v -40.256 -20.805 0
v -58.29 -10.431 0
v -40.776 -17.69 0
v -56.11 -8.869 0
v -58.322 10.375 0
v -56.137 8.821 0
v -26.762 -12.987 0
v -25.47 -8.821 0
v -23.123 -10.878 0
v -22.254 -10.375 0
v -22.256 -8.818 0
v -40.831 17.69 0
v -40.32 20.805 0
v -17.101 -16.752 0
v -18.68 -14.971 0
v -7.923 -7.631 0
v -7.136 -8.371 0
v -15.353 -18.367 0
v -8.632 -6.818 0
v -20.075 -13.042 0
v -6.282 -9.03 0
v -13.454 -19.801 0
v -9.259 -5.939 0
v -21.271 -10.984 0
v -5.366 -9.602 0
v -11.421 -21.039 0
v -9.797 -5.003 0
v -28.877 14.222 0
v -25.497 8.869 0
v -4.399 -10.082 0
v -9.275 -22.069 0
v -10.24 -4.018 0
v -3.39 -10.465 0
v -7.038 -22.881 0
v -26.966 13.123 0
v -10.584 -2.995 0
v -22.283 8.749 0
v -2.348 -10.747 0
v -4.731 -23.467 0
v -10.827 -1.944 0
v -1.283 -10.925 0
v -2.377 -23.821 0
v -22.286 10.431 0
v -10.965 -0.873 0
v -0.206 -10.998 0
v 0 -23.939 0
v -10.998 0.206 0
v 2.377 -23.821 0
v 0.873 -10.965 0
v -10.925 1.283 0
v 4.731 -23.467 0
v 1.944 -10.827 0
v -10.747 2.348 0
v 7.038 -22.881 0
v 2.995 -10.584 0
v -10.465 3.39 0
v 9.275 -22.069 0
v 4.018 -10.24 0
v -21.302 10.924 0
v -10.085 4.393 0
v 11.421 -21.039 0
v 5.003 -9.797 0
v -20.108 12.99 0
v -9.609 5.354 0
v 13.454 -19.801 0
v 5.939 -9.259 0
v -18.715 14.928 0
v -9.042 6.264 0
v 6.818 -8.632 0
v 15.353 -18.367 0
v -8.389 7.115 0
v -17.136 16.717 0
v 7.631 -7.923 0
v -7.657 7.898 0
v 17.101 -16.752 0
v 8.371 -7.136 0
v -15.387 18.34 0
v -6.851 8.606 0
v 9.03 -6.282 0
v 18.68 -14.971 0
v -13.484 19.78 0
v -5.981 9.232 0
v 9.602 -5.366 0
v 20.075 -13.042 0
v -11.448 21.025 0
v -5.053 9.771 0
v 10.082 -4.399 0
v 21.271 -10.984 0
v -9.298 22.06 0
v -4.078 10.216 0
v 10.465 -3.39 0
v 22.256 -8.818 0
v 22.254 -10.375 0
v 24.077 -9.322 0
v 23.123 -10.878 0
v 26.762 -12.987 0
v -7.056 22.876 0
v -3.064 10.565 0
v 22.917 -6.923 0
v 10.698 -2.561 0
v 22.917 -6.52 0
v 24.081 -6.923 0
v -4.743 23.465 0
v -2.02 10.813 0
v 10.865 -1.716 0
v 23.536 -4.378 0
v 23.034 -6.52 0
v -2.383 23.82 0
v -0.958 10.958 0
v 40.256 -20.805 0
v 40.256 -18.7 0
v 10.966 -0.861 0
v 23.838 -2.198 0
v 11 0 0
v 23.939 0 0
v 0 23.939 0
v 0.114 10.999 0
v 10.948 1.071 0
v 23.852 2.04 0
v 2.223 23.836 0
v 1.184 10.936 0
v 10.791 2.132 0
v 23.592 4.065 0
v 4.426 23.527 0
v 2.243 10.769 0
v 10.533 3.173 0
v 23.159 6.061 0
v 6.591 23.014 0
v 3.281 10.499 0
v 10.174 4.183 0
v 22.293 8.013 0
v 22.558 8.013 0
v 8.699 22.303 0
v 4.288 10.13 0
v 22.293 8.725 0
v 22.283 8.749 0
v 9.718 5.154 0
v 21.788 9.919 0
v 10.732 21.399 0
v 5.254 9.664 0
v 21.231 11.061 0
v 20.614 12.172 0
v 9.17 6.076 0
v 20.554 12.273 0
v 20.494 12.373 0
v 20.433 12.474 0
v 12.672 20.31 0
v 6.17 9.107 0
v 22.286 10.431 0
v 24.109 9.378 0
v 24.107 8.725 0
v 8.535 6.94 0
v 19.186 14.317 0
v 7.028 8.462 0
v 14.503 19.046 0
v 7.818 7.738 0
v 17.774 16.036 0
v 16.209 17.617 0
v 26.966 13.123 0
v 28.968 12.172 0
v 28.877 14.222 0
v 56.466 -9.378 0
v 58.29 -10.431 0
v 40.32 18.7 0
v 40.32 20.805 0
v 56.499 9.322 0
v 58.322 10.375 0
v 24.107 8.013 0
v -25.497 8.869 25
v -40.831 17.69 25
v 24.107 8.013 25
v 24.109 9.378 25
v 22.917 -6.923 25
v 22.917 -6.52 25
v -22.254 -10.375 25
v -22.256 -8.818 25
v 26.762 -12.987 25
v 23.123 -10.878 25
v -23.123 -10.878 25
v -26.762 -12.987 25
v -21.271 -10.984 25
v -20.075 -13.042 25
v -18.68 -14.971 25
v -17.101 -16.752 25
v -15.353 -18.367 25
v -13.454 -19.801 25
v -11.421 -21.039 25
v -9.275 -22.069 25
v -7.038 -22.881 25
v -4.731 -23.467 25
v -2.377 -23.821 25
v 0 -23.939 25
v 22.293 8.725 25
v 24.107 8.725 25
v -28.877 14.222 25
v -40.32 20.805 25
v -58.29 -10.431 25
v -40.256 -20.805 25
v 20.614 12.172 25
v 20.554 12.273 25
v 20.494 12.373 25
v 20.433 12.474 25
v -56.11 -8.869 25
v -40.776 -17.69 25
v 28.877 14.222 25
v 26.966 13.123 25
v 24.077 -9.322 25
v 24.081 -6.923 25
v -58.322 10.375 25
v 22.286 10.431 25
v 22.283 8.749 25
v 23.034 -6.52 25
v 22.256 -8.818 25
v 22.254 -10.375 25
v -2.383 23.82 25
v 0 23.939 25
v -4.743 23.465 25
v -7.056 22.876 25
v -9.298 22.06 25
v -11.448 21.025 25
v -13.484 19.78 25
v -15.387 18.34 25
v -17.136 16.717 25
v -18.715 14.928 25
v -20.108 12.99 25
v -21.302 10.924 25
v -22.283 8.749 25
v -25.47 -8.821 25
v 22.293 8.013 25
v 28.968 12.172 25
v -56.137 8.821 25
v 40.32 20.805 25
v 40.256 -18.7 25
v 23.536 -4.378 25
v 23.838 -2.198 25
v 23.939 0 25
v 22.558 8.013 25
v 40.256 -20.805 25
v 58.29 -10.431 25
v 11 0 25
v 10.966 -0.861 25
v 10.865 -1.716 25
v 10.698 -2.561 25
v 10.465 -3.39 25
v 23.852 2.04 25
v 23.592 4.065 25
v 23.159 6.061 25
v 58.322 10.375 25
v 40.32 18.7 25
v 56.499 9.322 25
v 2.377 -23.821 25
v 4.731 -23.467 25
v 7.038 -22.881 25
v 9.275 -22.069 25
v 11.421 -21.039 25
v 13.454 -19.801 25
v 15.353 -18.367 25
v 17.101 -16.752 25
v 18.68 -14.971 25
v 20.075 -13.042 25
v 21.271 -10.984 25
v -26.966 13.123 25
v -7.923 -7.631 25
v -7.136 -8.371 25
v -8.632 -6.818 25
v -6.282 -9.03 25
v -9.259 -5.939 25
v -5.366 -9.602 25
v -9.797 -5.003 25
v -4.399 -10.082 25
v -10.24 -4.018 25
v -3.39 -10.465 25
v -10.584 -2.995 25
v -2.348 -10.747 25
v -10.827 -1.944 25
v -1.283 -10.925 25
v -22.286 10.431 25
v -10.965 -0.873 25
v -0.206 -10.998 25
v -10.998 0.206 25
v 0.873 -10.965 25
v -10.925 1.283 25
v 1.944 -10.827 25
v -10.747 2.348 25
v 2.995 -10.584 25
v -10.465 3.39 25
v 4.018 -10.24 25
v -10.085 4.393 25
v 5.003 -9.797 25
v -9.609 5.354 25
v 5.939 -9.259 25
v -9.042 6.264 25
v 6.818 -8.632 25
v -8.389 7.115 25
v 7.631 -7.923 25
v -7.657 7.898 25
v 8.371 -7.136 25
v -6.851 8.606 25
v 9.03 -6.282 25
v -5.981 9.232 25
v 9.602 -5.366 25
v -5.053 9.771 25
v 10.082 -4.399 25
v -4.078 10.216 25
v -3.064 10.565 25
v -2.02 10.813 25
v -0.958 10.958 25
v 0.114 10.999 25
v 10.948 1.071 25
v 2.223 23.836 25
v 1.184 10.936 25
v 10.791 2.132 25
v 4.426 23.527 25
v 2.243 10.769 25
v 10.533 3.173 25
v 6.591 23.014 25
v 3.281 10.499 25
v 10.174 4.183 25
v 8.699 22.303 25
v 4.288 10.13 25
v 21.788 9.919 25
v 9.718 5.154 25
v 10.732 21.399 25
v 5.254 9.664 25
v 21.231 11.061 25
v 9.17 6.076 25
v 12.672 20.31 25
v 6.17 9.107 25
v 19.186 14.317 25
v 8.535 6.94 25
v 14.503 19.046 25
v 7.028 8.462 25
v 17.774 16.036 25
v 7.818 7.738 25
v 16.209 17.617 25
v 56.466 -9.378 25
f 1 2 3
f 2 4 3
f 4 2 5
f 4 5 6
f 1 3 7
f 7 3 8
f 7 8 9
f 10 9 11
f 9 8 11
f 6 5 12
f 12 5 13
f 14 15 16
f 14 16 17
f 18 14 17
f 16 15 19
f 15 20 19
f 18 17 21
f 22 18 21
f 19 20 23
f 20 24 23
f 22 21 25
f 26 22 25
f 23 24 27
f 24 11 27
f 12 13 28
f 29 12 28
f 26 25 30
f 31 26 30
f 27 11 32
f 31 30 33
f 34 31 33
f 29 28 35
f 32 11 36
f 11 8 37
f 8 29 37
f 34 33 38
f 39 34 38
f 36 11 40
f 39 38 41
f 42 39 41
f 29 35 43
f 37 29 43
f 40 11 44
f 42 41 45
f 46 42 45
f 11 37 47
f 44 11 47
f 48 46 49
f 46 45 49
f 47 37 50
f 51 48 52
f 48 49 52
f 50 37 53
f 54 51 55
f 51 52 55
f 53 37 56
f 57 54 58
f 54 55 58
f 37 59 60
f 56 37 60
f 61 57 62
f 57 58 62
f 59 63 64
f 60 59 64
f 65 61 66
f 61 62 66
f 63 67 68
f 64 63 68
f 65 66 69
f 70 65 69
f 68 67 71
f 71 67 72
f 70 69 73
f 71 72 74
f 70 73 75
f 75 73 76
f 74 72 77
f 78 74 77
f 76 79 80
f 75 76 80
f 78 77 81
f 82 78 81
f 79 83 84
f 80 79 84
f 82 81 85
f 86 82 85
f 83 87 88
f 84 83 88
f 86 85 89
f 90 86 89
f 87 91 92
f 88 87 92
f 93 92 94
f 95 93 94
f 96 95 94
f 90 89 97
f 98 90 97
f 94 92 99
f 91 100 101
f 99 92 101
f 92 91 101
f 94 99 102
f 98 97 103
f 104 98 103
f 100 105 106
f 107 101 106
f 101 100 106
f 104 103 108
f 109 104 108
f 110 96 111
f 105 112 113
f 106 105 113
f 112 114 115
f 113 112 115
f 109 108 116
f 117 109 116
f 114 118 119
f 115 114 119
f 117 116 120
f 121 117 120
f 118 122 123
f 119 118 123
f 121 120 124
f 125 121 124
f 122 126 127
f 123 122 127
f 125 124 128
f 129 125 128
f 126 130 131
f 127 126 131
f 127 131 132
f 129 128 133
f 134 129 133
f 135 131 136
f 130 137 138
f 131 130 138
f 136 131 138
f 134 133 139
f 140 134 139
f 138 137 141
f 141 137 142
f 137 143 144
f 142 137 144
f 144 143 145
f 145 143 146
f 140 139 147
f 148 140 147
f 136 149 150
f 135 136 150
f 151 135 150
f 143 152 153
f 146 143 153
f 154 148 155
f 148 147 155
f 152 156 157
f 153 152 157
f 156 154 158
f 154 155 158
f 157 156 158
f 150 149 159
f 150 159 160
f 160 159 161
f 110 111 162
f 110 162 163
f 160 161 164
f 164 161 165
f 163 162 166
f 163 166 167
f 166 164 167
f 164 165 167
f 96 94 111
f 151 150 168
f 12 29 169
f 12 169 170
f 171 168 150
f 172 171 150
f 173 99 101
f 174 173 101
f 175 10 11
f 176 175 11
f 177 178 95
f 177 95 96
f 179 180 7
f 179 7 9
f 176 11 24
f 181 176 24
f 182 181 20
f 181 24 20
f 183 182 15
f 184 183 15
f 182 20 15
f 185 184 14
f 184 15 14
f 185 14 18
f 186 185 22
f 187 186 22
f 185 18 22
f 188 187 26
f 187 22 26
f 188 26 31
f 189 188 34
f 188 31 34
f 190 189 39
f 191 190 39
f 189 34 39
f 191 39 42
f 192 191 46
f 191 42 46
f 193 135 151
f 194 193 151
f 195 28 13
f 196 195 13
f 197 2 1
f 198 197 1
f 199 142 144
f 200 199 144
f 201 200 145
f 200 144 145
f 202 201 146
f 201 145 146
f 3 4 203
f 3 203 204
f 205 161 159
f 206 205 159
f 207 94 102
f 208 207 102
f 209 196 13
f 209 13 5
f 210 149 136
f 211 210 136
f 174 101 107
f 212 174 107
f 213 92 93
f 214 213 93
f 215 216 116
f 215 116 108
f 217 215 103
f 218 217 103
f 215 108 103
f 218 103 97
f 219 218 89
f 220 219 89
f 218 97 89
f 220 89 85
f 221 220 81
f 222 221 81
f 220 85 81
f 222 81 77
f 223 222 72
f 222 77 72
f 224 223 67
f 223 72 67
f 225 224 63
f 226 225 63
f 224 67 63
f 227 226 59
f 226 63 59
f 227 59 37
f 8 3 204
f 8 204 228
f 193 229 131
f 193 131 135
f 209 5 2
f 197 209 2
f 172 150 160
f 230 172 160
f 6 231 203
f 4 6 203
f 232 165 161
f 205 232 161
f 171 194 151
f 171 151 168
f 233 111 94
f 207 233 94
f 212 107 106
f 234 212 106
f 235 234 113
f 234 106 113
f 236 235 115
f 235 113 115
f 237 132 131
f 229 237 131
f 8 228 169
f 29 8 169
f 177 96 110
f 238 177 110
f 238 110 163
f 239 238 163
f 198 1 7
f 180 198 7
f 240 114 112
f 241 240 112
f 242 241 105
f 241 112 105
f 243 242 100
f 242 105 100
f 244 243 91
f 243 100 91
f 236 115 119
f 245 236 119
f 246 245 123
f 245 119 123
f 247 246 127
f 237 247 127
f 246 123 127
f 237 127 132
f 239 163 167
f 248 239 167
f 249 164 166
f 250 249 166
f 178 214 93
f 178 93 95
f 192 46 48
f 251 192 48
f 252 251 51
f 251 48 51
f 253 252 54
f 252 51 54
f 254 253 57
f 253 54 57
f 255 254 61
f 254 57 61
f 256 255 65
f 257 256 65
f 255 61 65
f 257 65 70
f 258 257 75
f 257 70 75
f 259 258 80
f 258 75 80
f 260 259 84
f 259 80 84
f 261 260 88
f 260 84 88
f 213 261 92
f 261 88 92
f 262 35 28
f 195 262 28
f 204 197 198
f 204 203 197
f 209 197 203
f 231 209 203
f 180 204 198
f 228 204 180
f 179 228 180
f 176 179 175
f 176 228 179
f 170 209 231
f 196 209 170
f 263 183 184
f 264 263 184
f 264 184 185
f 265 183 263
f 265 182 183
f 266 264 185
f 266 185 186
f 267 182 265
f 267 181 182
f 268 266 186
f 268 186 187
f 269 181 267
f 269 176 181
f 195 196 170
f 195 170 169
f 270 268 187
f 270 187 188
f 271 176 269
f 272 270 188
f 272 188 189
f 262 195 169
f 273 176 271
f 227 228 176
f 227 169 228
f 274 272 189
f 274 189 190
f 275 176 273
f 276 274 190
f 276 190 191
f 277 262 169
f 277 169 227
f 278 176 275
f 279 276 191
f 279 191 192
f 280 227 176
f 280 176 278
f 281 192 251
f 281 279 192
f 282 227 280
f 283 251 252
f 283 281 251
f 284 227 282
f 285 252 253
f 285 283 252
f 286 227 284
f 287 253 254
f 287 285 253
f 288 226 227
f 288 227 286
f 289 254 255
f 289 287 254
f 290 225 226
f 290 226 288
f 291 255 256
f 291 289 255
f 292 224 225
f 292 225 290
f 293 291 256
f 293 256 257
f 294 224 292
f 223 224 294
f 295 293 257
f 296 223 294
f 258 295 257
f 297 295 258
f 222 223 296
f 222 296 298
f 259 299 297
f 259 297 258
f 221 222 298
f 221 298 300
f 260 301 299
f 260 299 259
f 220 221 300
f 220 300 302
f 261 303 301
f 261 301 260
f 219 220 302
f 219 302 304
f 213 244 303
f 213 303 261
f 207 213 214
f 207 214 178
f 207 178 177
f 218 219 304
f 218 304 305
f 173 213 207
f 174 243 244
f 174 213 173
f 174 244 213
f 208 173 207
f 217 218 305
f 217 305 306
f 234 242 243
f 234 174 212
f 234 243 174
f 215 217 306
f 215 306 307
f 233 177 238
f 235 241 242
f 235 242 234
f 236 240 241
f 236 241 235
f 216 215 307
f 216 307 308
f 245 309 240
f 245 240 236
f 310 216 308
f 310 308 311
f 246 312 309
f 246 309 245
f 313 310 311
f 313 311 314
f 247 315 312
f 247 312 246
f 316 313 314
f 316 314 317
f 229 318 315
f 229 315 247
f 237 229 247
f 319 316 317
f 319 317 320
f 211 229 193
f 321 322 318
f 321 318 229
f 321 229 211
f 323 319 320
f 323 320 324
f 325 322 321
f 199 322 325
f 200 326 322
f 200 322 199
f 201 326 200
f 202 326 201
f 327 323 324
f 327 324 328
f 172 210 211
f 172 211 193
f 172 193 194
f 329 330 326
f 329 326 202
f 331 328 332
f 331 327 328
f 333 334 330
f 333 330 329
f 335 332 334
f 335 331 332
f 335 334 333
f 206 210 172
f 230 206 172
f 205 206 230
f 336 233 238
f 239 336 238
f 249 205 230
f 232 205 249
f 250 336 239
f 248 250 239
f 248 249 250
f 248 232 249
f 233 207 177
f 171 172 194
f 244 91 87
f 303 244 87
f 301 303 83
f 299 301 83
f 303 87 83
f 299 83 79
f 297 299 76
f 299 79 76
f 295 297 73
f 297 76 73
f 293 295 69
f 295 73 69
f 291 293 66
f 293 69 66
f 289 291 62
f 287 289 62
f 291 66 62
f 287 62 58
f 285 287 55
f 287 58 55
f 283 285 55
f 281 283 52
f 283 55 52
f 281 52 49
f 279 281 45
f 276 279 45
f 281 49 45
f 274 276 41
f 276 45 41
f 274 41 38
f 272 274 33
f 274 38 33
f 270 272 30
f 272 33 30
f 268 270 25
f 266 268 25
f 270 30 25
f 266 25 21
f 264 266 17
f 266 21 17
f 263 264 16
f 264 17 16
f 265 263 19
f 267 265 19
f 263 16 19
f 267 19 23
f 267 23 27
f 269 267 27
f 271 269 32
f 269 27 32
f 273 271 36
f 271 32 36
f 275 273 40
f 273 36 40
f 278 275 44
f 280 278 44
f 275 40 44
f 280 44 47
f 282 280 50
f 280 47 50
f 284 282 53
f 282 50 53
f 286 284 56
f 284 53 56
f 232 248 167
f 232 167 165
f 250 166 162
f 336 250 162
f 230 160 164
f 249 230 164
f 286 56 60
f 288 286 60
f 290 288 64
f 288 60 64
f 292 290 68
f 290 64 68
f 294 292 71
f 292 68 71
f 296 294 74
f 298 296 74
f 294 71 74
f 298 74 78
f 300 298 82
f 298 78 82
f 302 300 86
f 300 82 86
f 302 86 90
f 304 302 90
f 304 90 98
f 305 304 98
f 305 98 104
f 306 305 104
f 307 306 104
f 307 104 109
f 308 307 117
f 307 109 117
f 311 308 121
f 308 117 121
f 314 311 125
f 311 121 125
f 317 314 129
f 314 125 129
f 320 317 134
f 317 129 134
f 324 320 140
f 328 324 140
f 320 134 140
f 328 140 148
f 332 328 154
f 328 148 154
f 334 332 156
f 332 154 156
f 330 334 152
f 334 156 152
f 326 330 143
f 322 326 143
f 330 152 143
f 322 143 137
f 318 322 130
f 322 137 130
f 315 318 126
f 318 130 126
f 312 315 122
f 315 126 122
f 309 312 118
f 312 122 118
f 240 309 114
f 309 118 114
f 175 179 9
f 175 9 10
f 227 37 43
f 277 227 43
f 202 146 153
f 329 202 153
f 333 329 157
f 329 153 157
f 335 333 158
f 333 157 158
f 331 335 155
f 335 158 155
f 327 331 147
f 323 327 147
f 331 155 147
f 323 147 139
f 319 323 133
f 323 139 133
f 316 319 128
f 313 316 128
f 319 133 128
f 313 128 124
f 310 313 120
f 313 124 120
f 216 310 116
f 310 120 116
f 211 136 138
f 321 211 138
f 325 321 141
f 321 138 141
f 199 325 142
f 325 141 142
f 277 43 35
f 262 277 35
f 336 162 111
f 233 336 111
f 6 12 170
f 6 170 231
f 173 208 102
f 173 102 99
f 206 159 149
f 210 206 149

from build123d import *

# Parameters (mm, degrees)
F1_DEPTH = 25
F3_DEPTH = 25


with BuildPart() as f1:
    # F0 (on Top) → F1 (new body)
    with BuildSketch(Plane.XY):
        with BuildLine():
            ThreePointArc((-10.4646871668, 3.3897378218), (1.7158731254, 10.8653476437), (11, 0))
            ThreePointArc((11, 0), (10.8653476437, -1.7158731254), (10.4646871668, -3.3897378218))
            ThreePointArc((10.4646871668, -3.3897378218), (11.5303364364, -16.8717211773), (0, -23.9393109523))
            ThreePointArc((0, -23.9393109523), (13.4535838876, -19.8013052461), (22.2561561395, -8.8178298218))
            Line((22.2561561395, -8.8178298218), (22.2834265087, 8.7486862959))
            ThreePointArc((22.2834265087, 8.7486862959), (21.5168684816, 10.4935684883), (20.6139374132, 12.1719428685))
            Line((20.6139374132, 12.1719428685), (20.4327683896, 12.1719428685))
            Line((20.4327683896, 12.1719428685), (20.4327683896, 12.4736756736))
            ThreePointArc((20.4327683896, 12.4736756736), (11.7149350874, 20.8770425293), (0, 23.9393109523))
            ThreePointArc((0, 23.9393109523), (-11.5303364364, 16.8717211773), (-10.4646871668, 3.3897378218))
        make_face()
        with BuildLine():
            ThreePointArc((10.4646871668, -3.3897378218), (-3.3897378218, -10.4646871668), (-10.4646871668, 3.3897378218))
            ThreePointArc((-10.4646871668, 3.3897378218), (-11.5303364364, 16.8717211773), (0, 23.9393109523))
            ThreePointArc((0, 23.9393109523), (-13.4843073091, 19.7803959836), (-22.2834265087, 8.7486862959))
            Line((-22.2834265087, 8.7486862959), (-22.2561561395, -8.8178298218))
            ThreePointArc((-22.2561561395, -8.8178298218), (-13.4535838876, -19.8013052461), (0, -23.9393109523))
            ThreePointArc((0, -23.9393109523), (11.5303364364, -16.8717211773), (10.4646871668, -3.3897378218))
        make_face()
        with BuildLine():
            ThreePointArc((20.6139374132, 12.1719428685), (20.5239074006, 12.3231422082), (20.4327683896, 12.4736756736))
            Line((20.4327683896, 12.4736756736), (20.4327683896, 12.1719428685))
            Line((20.4327683896, 12.1719428685), (20.6139374132, 12.1719428685))
        make_face()
        with BuildLine():
            Line((-22.2561561395, -8.8178298218), (-22.2834265087, 8.7486862959))
            ThreePointArc((-22.2834265087, 8.7486862959), (-22.3171762669, 8.6622313721), (-22.3505905999, 8.5756462558))
            ThreePointArc((-22.3505905999, 8.5756462558), (-22.9180889493, 6.917500111), (-23.3627568452, 5.2222793359))
            ThreePointArc((-23.3627568452, 5.2222793359), (-23.9236754966, -0.865077803), (-22.9245601537, -6.8960242628))
            ThreePointArc((-22.9245601537, -6.8960242628), (-22.876956445, -7.0523381007), (-22.8282869054, -7.2083233721))
            ThreePointArc((-22.8282869054, -7.2083233721), (-22.5565817206, -8.0181812122), (-22.2561561395, -8.8178298218))
        make_face()
        with BuildLine():
            ThreePointArc((-22.3505905999, 8.5756462558), (-22.3171762669, 8.6622313721), (-22.2834265087, 8.7486862959))
            Line((-22.2834265087, 8.7486862959), (-22.2860376354, 10.4306730632))
            Line((-22.2860376354, 10.4306730632), (-26.9655953528, 13.1227395452))
            Line((-26.9655953528, 13.1227395452), (-28.876762415, 14.2222000286))
            Line((-28.876762415, 14.2222000286), (-40.3201948997, 20.8054035902))
            Line((-40.3201948997, 20.8054035902), (-58.3220537256, 10.374730527))
            Line((-58.3220537256, 10.374730527), (-58.2897552873, -10.4306730632))
            Line((-58.2897552873, -10.4306730632), (-40.2555980231, -20.8054035902))
            Line((-40.2555980231, -20.8054035902), (-26.7618837097, -12.9868486414))
            Line((-26.7618837097, -12.9868486414), (-23.1227707365, -10.8782665205))
            Line((-23.1227707365, -10.8782665205), (-22.2537391971, -10.374730527))
            Line((-22.2537391971, -10.374730527), (-22.2561561395, -8.8178298218))
            ThreePointArc((-22.2561561395, -8.8178298218), (-22.5565817206, -8.0181812122), (-22.8282869054, -7.2083233721))
            ThreePointArc((-22.8282869054, -7.2083233721), (-22.876956445, -7.0523381007), (-22.9245601537, -6.8960242628))
            ThreePointArc((-22.9245601537, -6.8960242628), (-23.9236754966, -0.865077803), (-23.3627568452, 5.2222793359))
            ThreePointArc((-23.3627568452, 5.2222793359), (-22.9180889493, 6.917500111), (-22.3505905999, 8.5756462558))
        make_face()
        with BuildLine():
            Line((22.2834265087, 8.7486862959), (22.2561561395, -8.8178298218))
            ThreePointArc((22.2561561395, -8.8178298218), (22.6061950021, -7.8772175544), (22.9165006409, -6.9227600889))
            Line((22.9165006409, -6.9227600889), (22.9165006409, -6.5203195466))
            Line((22.9165006409, -6.5203195466), (23.0342362991, -6.5203195466))
            ThreePointArc((23.0342362991, -6.5203195466), (23.7119627423, -3.291417898), (23.9393109523, 0))
            ThreePointArc((23.9393109523, 0), (23.5915816395, 4.0654501127), (22.5584955519, 8.0127952242))
            Line((22.5584955519, 8.0127952242), (22.2926987152, 8.0127952242))
            Line((22.2926987152, 8.0127952242), (22.2926987152, 8.7250325423))
            ThreePointArc((22.2926987152, 8.7250325423), (22.2880657498, 8.7368606491), (22.2834265087, 8.7486862959))
        make_face()
        with BuildLine():
            ThreePointArc((22.9165006409, -6.9227600889), (22.6061950021, -7.8772175544), (22.2561561395, -8.8178298218))
            Line((22.2561561395, -8.8178298218), (22.2537391971, -10.374730527))
            Line((22.2537391971, -10.374730527), (23.1227707365, -10.8782665205))
            Line((23.1227707365, -10.8782665205), (26.7618837097, -12.9868486414))
            Line((26.7618837097, -12.9868486414), (40.2555980231, -20.8054035902))
            Line((40.2555980231, -20.8054035902), (58.2897552873, -10.4306730632))
            Line((58.2897552873, -10.4306730632), (58.3220537256, 10.374730527))
            Line((58.3220537256, 10.374730527), (40.3201948997, 20.8054035902))
            Line((40.3201948997, 20.8054035902), (28.876762415, 14.2222000286))
            Line((28.876762415, 14.2222000286), (28.9680806238, 14.2222000286))
            Line((28.9680806238, 14.2222000286), (28.9680806238, 12.1719428685))
            Line((28.9680806238, 12.1719428685), (40.3201948997, 18.6999721072))
            Line((40.3201948997, 18.6999721072), (56.4986965755, 9.3220147855))
            Line((56.4986965755, 9.3220147855), (56.4663981371, -9.3779573217))
            Line((56.4663981371, -9.3779573217), (40.2555980231, -18.6999721072))
            Line((40.2555980231, -18.6999721072), (24.0770963473, -9.3220147855))
            Line((24.0770963473, -9.3220147855), (24.0812403203, -6.9227600889))
            Line((24.0812403203, -6.9227600889), (22.9165006409, -6.9227600889))
        make_face()
        with BuildLine():
            Line((22.2860376354, 10.4306730632), (22.2834265087, 8.7486862959))
            ThreePointArc((22.2834265087, 8.7486862959), (22.2880657498, 8.7368606491), (22.2926987152, 8.7250325423))
            Line((22.2926987152, 8.7250325423), (24.1070368889, 8.7250325423))
            Line((24.1070368889, 8.7250325423), (24.1070368889, 8.0127952242))
            Line((24.1070368889, 8.0127952242), (24.1093947856, 9.3779573217))
            Line((24.1093947856, 9.3779573217), (28.9680806238, 12.1719428685))
            Line((28.9680806238, 12.1719428685), (28.9680806238, 14.2222000286))
            Line((28.9680806238, 14.2222000286), (28.876762415, 14.2222000286))
            Line((28.876762415, 14.2222000286), (26.9655953528, 13.1227395452))
            Line((26.9655953528, 13.1227395452), (22.2860376354, 10.4306730632))
        make_face()
    extrude(amount=F1_DEPTH)

    # F2 (on face) → F3 (cut)
    with BuildSketch(Plane.XY.offset(25)):
        Polygon((-56.1096642619, -8.8687674562), (-40.7759704459, -17.6899693007), (-25.4697386486, -8.8212018445), (-25.4972006673, 8.8687674562), (-40.8308944833, 17.6899693007), (-56.1371262806, 8.8212018445), align=None)
    extrude(amount=-F3_DEPTH, mode=Mode.SUBTRACT)


solid = f1.part
